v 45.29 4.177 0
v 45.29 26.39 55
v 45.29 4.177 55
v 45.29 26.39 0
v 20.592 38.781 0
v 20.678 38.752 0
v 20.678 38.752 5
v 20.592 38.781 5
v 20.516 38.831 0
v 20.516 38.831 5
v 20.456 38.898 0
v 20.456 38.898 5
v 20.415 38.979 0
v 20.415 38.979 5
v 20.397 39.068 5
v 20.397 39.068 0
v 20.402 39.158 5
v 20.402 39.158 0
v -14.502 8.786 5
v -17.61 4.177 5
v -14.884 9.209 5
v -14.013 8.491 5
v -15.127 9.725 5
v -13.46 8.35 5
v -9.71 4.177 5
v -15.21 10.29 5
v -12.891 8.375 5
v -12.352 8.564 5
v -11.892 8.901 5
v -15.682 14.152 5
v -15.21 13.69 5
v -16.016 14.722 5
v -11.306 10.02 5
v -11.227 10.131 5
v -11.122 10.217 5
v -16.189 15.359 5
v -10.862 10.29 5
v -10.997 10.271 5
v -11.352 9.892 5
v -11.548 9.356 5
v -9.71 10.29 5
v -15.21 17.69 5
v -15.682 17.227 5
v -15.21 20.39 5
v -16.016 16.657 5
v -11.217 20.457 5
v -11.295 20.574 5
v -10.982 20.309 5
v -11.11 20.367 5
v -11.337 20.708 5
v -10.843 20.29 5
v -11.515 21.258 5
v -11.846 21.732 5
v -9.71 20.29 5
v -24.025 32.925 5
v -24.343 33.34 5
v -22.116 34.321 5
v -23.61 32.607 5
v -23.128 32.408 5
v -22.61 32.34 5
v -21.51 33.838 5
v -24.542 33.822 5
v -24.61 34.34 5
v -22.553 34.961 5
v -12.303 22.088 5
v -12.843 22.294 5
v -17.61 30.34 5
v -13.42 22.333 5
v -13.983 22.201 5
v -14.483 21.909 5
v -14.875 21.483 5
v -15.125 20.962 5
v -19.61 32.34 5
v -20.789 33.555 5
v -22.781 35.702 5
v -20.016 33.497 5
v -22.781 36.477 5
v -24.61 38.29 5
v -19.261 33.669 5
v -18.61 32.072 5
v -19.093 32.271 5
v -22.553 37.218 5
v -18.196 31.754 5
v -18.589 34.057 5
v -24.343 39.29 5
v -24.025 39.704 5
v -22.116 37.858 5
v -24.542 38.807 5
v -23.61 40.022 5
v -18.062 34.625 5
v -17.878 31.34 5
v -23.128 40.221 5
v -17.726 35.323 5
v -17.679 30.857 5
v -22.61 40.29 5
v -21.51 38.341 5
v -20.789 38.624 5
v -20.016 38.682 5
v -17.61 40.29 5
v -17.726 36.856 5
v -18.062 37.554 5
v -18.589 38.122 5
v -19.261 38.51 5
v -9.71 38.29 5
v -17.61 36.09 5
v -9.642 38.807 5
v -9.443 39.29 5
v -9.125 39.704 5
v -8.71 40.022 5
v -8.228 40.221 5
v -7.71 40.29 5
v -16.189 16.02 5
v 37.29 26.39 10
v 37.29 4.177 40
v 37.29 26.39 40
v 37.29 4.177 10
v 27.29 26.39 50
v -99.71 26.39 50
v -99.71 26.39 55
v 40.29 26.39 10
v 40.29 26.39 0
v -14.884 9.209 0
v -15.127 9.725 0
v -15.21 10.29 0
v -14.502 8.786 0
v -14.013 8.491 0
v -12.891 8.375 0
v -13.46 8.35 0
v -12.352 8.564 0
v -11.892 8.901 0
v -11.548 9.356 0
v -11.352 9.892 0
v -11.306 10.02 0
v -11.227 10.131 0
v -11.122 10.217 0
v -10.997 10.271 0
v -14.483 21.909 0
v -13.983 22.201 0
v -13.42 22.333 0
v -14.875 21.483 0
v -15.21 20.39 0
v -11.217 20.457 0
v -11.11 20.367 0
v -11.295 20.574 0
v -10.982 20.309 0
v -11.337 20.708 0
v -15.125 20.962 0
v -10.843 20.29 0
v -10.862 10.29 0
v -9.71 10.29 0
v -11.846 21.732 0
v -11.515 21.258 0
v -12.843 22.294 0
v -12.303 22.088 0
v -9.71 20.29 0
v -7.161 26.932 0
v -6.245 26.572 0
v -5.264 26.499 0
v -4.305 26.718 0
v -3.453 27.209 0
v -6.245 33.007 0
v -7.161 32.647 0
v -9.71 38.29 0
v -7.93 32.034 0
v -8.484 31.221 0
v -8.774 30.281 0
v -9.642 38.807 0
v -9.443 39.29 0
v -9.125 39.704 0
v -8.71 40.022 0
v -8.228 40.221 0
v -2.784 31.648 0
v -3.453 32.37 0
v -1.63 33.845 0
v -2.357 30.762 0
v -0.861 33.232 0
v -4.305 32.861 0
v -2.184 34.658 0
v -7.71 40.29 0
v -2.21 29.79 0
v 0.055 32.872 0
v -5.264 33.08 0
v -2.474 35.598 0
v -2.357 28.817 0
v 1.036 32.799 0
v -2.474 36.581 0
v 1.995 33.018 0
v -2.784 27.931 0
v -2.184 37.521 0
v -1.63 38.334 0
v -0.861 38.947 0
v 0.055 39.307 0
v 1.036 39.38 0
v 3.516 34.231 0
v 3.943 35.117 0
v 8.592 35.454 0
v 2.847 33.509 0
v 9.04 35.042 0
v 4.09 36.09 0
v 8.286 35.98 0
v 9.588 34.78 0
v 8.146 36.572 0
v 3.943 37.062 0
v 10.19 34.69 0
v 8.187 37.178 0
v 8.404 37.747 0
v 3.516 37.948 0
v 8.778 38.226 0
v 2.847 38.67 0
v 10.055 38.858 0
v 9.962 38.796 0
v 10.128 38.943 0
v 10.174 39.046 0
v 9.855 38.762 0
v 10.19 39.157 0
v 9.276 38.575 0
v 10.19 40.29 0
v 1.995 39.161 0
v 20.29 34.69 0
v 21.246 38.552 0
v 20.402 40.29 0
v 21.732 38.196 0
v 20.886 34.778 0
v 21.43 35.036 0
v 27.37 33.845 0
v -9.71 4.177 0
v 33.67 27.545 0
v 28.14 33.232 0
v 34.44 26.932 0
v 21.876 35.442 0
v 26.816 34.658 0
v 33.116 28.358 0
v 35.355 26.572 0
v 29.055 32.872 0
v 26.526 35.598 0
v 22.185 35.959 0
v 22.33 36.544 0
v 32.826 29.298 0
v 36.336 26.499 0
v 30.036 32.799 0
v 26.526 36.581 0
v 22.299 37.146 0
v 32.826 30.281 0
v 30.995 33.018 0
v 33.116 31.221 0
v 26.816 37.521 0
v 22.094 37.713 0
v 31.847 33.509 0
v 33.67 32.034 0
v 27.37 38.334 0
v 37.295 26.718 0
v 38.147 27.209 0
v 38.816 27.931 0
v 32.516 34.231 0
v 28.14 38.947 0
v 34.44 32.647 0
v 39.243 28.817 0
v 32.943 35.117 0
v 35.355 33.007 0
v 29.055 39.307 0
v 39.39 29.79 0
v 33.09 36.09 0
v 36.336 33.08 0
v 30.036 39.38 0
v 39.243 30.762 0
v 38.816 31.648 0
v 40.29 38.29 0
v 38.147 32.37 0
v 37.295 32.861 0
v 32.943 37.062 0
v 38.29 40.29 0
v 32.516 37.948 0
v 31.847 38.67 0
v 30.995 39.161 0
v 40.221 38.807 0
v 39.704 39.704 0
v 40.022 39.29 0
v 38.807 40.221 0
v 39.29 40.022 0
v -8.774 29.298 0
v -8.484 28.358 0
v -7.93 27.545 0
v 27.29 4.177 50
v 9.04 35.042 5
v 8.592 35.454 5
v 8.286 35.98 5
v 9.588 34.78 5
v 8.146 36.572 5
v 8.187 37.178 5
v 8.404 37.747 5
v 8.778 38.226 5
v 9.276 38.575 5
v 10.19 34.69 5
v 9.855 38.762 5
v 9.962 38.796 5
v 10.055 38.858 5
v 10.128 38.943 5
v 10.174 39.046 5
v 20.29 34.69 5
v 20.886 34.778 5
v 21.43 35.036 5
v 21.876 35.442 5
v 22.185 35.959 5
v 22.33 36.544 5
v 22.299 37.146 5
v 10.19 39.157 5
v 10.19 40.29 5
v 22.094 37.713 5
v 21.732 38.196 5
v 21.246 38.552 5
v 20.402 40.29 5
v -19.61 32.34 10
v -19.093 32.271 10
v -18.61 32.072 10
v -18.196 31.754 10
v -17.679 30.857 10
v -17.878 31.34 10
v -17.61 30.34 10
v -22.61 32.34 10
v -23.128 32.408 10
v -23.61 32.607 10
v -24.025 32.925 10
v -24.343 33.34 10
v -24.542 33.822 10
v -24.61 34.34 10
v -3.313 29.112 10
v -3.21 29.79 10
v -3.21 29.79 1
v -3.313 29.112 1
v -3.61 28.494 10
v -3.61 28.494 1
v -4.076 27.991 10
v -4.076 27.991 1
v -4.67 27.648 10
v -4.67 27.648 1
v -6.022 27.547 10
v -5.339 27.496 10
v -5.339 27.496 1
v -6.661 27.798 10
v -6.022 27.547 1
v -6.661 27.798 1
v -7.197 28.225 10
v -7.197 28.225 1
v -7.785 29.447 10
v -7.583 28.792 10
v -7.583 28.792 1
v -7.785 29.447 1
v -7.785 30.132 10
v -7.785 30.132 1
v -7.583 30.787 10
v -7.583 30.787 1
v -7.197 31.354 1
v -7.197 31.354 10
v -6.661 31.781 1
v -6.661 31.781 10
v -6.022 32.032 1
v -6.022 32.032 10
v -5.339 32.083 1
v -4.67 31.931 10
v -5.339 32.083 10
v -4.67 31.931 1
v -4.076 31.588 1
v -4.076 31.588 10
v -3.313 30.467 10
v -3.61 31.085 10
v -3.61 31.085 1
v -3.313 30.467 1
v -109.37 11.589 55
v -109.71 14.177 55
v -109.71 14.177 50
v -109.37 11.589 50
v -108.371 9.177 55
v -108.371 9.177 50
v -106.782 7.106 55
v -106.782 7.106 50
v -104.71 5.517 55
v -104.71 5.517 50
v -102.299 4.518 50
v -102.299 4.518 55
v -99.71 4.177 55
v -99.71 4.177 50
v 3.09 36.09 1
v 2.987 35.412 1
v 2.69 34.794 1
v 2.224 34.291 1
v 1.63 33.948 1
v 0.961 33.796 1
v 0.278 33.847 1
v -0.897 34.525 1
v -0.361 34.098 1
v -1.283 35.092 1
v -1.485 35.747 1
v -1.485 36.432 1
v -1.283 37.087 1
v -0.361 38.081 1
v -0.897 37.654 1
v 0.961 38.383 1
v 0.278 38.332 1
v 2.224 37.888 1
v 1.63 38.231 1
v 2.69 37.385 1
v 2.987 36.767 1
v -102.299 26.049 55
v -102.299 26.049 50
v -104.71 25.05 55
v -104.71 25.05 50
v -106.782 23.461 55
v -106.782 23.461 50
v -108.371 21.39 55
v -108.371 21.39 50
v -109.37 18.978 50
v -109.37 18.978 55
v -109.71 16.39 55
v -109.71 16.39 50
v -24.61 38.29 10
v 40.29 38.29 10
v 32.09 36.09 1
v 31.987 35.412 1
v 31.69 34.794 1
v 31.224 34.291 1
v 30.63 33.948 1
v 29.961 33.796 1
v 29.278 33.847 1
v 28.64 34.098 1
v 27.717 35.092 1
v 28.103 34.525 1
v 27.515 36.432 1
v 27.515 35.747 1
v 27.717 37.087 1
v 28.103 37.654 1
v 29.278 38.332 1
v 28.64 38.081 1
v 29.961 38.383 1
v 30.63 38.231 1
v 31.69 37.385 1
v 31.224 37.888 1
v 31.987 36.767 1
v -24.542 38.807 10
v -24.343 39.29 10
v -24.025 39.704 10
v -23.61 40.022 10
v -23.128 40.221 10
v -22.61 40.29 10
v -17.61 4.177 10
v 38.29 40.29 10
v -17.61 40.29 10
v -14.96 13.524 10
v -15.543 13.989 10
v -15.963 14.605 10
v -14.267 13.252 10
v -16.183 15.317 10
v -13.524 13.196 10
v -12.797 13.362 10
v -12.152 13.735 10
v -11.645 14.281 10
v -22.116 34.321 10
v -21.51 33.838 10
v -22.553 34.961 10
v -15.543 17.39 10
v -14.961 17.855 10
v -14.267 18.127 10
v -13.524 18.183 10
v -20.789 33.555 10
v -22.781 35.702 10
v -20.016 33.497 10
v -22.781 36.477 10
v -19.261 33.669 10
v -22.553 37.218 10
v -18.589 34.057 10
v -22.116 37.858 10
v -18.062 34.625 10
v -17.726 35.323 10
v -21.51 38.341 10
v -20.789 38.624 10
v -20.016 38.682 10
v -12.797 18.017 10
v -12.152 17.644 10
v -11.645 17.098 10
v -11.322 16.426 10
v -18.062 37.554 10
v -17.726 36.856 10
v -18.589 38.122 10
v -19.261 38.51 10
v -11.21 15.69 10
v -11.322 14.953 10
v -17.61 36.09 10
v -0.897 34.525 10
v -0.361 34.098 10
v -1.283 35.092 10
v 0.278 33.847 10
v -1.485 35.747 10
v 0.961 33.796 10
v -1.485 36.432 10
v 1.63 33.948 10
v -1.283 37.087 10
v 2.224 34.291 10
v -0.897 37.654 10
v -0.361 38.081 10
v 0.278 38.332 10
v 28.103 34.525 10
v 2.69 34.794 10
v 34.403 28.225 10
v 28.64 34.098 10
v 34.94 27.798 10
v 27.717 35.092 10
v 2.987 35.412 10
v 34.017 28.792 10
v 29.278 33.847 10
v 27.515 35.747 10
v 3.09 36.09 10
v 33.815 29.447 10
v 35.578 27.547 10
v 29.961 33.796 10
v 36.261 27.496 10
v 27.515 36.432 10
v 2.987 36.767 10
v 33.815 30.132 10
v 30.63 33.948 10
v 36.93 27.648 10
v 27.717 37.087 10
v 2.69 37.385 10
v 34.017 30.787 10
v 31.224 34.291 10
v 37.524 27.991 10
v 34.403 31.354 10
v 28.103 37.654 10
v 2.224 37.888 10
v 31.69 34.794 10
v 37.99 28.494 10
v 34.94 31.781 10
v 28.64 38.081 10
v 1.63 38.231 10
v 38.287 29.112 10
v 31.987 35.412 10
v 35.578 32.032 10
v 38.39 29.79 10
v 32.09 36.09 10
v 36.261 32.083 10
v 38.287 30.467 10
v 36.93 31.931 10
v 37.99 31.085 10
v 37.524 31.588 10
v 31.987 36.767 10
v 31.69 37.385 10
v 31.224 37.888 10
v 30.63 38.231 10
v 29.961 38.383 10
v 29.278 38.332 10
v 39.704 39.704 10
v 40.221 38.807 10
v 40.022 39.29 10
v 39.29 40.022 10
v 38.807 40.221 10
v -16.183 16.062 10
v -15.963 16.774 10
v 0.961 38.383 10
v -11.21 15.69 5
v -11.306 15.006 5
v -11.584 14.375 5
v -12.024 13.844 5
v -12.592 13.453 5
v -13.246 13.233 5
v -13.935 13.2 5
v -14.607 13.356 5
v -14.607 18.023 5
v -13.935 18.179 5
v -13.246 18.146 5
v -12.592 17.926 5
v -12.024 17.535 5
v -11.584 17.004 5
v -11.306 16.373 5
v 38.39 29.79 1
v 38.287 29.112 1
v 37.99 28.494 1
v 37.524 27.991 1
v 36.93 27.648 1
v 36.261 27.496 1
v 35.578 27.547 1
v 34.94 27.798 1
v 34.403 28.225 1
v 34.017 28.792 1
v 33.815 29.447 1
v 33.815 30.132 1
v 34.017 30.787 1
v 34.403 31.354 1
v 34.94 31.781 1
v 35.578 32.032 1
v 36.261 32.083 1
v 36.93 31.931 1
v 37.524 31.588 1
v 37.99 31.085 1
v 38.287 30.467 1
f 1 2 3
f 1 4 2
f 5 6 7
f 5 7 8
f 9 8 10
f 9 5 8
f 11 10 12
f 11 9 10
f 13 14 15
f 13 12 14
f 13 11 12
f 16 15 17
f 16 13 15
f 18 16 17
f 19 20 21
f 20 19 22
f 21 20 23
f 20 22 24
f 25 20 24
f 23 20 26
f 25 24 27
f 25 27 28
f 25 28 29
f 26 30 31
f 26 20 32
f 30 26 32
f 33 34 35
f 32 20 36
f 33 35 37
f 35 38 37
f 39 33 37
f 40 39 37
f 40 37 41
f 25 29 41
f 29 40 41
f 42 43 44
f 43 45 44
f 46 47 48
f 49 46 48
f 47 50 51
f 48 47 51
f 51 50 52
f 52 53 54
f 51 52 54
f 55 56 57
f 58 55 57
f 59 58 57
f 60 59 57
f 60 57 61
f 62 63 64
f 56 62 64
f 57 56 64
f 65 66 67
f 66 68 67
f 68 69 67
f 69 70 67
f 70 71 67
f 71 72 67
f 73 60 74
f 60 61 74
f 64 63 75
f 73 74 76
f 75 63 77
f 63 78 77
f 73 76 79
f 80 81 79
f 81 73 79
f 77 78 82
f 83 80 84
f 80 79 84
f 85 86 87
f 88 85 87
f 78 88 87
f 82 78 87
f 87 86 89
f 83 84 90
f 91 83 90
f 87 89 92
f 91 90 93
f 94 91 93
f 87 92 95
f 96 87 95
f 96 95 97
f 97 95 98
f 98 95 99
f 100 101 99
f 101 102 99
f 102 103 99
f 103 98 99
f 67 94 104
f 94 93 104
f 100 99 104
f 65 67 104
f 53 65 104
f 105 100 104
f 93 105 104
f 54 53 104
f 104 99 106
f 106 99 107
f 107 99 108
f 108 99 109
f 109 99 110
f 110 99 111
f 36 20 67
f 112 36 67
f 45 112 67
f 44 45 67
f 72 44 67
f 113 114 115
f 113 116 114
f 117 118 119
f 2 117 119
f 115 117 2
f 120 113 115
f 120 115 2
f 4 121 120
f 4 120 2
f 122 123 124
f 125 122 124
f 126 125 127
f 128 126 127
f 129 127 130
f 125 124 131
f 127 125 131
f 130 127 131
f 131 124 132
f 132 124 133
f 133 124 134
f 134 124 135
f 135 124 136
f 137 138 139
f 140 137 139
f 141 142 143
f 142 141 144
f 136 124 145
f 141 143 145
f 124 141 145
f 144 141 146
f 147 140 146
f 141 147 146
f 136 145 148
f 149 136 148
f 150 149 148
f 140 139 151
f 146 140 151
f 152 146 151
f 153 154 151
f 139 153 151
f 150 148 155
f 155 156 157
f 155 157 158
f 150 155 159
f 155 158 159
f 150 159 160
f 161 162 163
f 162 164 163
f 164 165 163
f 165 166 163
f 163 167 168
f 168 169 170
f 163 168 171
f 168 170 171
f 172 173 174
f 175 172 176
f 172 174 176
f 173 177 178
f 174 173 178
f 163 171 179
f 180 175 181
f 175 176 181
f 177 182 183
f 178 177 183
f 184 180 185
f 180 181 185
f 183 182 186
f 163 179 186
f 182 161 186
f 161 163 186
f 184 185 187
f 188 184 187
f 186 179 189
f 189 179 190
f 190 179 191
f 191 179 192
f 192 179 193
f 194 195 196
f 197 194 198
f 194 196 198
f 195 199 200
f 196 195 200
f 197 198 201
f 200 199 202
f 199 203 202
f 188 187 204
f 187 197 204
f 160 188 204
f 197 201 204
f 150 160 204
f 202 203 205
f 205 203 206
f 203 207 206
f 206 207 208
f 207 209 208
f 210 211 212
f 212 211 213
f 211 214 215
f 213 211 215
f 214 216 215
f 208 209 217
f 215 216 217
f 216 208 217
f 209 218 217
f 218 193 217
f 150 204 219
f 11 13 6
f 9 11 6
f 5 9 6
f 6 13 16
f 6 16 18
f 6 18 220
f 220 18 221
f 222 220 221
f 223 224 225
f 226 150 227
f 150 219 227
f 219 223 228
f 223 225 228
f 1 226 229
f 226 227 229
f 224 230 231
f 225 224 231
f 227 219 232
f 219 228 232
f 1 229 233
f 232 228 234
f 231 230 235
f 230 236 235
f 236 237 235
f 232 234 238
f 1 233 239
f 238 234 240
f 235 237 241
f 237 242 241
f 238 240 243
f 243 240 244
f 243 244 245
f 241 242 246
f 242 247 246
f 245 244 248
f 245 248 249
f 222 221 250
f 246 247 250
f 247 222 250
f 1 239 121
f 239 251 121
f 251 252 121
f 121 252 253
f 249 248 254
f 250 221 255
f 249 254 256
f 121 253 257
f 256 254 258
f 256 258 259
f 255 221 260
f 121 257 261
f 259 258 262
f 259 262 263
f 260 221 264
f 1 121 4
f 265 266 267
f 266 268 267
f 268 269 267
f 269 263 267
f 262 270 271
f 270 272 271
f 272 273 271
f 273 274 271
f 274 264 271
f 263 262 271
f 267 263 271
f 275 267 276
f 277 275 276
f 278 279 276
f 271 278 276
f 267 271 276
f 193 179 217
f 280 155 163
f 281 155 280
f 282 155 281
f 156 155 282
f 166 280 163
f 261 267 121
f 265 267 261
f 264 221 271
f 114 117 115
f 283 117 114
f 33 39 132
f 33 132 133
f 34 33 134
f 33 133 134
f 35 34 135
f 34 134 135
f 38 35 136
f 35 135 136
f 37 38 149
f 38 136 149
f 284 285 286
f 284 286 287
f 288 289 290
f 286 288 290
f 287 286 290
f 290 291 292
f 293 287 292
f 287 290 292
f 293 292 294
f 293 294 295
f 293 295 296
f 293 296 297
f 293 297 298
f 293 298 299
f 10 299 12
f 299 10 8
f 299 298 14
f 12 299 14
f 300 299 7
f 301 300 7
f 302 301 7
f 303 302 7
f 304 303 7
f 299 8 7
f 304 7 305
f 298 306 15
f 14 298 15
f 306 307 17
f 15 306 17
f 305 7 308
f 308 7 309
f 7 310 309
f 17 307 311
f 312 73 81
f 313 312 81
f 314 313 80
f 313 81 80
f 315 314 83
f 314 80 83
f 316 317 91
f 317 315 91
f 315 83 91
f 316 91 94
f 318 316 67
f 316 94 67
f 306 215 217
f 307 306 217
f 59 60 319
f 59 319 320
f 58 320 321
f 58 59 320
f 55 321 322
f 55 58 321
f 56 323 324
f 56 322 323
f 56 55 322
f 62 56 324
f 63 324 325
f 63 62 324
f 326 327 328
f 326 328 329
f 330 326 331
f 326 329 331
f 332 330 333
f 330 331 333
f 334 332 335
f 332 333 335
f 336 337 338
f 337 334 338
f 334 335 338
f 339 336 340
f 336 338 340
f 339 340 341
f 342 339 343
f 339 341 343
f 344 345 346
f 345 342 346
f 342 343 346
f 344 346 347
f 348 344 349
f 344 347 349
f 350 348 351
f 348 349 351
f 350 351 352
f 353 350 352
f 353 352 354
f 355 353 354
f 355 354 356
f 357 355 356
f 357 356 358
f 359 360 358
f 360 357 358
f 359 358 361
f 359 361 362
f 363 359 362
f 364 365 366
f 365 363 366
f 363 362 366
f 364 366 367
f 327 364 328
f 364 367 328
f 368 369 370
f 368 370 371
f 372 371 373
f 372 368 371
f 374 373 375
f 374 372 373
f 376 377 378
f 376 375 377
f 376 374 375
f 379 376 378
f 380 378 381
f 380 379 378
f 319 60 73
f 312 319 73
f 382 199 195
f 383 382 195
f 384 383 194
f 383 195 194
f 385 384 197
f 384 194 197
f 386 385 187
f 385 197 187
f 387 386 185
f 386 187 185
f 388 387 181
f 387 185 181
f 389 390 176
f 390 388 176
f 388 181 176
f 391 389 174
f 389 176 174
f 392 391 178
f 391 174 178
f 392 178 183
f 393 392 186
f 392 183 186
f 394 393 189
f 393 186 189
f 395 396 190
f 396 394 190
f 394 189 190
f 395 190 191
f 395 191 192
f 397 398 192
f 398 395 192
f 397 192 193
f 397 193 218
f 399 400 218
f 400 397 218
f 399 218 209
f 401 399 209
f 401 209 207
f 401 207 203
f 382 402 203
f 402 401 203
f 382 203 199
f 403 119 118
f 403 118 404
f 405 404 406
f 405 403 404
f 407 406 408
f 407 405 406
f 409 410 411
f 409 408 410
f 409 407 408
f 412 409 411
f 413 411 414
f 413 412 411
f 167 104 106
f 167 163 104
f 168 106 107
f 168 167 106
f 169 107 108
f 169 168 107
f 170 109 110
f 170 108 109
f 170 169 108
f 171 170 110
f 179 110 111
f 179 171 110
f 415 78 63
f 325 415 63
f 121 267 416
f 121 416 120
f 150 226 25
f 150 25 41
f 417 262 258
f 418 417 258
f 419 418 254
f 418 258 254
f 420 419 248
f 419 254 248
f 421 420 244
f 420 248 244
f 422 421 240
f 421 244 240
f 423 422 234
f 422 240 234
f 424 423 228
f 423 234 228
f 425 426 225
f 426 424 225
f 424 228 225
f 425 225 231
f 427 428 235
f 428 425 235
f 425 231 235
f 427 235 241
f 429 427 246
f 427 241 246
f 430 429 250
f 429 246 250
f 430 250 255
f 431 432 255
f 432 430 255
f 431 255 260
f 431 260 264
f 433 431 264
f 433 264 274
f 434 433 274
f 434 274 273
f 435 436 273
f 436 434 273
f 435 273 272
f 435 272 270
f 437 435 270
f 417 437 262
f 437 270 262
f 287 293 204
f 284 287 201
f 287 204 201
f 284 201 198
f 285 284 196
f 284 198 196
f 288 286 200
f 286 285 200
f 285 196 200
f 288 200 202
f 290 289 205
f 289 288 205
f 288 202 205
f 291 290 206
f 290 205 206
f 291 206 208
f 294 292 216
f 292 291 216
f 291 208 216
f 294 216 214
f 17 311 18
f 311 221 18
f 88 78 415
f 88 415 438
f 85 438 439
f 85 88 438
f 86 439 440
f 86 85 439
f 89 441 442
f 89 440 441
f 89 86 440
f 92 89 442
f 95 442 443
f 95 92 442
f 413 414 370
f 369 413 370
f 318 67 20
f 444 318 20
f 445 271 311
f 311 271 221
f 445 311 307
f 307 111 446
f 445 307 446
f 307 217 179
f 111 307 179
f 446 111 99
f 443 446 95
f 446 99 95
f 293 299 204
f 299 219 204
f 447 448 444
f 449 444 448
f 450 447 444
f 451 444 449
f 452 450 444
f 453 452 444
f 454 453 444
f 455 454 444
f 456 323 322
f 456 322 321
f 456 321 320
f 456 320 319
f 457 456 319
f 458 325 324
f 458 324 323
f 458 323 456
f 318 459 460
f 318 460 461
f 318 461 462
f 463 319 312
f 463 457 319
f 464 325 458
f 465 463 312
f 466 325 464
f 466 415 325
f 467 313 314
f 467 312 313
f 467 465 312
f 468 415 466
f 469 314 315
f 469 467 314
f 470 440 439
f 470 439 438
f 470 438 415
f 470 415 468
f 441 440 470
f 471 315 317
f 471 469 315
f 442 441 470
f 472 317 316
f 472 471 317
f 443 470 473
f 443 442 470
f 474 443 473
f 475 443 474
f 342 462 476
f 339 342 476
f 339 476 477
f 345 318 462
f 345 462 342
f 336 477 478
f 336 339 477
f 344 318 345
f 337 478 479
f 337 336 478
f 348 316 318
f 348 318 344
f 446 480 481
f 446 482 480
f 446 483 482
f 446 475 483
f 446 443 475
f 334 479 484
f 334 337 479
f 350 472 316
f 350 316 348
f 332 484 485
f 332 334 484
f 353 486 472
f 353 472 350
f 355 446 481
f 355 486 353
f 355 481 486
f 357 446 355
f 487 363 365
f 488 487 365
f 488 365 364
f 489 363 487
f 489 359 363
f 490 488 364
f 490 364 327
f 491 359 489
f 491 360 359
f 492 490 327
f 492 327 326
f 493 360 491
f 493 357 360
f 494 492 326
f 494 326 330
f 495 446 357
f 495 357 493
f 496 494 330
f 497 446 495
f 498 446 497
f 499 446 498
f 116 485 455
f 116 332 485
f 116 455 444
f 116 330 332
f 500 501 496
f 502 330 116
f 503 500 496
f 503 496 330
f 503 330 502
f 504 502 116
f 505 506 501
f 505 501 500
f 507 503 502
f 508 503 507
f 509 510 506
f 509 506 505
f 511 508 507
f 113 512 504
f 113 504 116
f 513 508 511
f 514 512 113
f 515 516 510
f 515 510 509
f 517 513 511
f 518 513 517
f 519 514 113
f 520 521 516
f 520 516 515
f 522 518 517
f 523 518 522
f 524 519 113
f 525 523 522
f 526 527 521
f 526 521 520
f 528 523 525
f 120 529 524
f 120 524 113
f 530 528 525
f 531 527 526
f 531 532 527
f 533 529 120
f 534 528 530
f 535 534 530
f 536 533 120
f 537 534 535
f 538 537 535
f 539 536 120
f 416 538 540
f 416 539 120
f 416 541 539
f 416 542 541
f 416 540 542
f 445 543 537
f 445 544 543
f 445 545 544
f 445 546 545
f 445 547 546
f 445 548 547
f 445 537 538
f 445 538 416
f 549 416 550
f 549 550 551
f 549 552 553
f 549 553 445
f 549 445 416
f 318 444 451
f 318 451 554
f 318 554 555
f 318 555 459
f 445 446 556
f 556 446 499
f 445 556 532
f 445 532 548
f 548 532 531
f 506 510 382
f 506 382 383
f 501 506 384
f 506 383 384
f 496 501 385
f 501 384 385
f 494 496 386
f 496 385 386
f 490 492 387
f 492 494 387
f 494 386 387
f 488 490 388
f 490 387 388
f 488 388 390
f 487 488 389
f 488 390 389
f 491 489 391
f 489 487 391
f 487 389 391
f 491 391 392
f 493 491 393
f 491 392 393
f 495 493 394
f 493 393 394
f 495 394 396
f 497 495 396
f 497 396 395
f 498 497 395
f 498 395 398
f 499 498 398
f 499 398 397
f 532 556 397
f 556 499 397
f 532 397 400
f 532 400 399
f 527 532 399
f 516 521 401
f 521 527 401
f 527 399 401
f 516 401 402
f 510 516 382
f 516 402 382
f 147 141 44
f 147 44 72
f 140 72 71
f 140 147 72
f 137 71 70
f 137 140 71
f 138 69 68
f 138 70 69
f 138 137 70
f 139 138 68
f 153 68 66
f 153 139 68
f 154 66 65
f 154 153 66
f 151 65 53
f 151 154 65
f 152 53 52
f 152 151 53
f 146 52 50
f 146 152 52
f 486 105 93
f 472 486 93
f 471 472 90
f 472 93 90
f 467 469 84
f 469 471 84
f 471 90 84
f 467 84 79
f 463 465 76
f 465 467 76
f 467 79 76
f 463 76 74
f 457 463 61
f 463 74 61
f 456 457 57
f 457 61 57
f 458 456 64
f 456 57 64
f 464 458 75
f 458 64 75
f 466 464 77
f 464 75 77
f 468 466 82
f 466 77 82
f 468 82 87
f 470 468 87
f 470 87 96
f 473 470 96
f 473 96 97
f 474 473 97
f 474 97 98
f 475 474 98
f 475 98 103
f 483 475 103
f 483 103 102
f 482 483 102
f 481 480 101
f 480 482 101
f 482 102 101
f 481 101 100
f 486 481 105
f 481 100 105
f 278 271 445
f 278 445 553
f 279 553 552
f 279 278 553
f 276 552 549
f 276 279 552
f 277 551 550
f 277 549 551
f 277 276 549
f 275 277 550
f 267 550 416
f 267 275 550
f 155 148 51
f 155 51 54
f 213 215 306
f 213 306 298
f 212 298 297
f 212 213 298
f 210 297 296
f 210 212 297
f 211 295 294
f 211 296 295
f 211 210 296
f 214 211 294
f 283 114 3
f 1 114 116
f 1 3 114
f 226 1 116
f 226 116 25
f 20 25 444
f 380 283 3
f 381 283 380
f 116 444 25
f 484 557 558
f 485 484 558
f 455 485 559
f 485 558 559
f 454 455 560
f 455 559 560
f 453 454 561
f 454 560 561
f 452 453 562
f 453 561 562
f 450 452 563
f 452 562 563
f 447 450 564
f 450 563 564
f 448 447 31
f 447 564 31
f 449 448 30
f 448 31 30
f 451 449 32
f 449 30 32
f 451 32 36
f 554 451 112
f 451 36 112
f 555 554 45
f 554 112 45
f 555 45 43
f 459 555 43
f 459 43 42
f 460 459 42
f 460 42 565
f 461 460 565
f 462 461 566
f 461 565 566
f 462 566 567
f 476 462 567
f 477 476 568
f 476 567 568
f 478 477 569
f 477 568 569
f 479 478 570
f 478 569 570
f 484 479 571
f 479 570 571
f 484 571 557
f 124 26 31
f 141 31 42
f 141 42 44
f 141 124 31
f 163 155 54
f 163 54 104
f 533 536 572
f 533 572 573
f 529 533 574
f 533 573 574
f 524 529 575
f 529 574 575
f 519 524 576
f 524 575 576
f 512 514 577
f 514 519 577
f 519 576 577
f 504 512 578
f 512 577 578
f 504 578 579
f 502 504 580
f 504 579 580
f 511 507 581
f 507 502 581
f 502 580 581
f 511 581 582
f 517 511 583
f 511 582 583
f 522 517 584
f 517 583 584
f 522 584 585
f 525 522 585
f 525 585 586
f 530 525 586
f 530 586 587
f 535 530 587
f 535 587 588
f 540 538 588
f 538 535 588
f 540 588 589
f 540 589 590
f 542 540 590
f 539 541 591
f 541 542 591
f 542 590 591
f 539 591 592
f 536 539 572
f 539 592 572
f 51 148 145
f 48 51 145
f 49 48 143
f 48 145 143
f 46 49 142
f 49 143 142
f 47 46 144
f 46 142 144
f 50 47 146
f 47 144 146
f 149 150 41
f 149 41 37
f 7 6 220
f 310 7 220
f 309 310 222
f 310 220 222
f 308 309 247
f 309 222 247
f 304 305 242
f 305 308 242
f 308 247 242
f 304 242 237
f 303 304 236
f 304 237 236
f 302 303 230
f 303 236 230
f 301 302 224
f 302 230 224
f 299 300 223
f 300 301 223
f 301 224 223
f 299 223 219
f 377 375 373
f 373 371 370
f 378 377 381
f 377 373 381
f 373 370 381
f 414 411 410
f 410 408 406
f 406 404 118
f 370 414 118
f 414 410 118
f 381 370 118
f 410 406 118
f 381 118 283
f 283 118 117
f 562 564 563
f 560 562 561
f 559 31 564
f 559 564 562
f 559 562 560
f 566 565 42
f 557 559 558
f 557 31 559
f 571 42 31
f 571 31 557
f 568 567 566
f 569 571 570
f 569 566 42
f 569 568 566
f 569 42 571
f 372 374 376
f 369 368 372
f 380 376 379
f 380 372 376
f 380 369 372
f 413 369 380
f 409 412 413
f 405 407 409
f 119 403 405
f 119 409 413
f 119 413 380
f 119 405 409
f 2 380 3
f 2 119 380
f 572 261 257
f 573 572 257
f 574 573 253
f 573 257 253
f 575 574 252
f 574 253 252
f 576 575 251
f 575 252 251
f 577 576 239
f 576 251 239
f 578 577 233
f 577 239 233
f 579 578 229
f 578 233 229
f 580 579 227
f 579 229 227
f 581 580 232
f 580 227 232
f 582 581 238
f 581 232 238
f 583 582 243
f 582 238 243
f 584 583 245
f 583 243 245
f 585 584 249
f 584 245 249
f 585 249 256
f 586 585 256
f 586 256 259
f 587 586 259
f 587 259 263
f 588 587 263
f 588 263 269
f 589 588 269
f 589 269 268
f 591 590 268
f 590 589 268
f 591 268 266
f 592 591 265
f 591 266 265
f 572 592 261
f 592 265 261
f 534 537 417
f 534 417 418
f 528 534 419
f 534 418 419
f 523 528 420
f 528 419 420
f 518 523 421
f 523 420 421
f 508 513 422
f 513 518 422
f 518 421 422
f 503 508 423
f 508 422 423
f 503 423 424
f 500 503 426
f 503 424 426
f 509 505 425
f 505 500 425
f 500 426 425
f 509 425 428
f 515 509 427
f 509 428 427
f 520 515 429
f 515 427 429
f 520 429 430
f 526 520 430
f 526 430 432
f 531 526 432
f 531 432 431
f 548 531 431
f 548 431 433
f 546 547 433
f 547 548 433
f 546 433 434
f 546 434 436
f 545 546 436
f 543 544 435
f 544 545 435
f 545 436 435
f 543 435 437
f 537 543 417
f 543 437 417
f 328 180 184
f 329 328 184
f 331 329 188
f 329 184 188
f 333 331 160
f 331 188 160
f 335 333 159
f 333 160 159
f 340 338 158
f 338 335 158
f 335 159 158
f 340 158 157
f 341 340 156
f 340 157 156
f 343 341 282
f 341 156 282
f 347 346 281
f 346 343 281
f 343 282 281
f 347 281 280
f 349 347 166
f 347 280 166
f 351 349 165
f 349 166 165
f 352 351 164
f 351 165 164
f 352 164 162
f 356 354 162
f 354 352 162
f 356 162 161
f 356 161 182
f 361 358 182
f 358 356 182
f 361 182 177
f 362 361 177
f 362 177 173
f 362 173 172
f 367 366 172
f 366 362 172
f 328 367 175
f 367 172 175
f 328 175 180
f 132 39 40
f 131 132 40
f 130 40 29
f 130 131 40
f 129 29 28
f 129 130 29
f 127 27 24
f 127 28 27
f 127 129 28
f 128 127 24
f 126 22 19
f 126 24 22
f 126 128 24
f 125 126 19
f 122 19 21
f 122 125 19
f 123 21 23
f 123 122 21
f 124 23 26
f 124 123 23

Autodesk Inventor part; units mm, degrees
ref_plane "YZ Plane" through (0, 0, 0) normal (1, 0, 0) x (0, 1, 0)
ref_plane "XZ Plane" through (0, 0, 0) normal (0, 1, 0) x (-1, 0, 0)
ref_plane "XY Plane" through (0, 0, 0) normal (0, 0, 1) x (1, 0, 0)
ref_plane "Arbeitsebene1" through (0, 0, 0) normal (0, 0, 1) x (1, 0, 0)
sketch "Skizze1" plane through (0, 0, 0) normal (0, 0, 1) x (1, 0, 0)
  circle A0 centre (-6.0705, 15.2895) radius 3.5 projected
  circle A1 centre (15.2895, -6.0705) radius 3.5 projected
  line L0 (30.5395, 32.5395) -> (0.0395, 32.5395) projected
  arc A2 (32.5395, 30.5395) -> (30.5395, 32.5395) centre (30.5395, 30.5395) ccw projected
  line L1 (32.5395, 30.5395) -> (32.5395, 0.0395) projected
  arc A3 (30.5395, -1.9605) -> (32.5395, 0.0395) centre (30.5395, 0.0395) ccw projected
  line L2 (0.0395, -1.9605) -> (30.5395, -1.9605) projected
  arc A4 (-1.9605, 0.0395) -> (0.0395, -1.9605) centre (0.0395, 0.0395) ccw projected
  line L3 (-1.9605, 0.0395) -> (-1.9605, 30.5395) projected
  arc A5 (0.0395, 32.5395) -> (-1.9605, 30.5395) centre (0.0395, 30.5395) ccw projected
  circle A6 centre (-4.7105, -4.7105) radius 2.45 projected
  circle A7 centre (0.7895, -5.5105) radius 2.3 projected
  circle A8 centre (-5.5105, 0.7895) radius 2.3 projected
  circle A9 centre (-5.5105, 29.7895) radius 2.3 projected
  circle A10 centre (0.7895, 36.0895) radius 2.3 projected
  circle A11 centre (-4.7105, 35.2895) radius 2.45 projected
  circle A12 centre (36.0895, 0.7895) radius 2.3 projected
  circle A13 centre (29.7895, -5.5105) radius 2.3 projected
  circle A14 centre (35.2895, -4.7105) radius 2.45 projected
  circle A15 centre (36.0895, 29.7895) radius 2.3 projected
  circle A16 centre (29.7895, 36.0895) radius 2.3 projected
  circle A17 centre (35.2895, 35.2895) radius 2.45 projected
  line L4 (20.4019, 40.2895) -> (20.4019, 39.1582) projected
  arc A18 (20.4019, 39.1582) -> (20.6778, 38.7524) centre (20.7437, 39.0939) ccw projected
  arc A19 (20.2895, 34.6895) -> (20.6778, 38.7524) centre (20.2895, 36.7395) ccw projected
  line L5 (20.2895, 34.6895) -> (10.1895, 34.6895) projected
  arc A20 (9.8548, 38.762) -> (10.1895, 34.6895) centre (10.1895, 36.7395) ccw projected
  arc A21 (9.8548, 38.762) -> (10.1895, 39.1567) centre (9.7895, 39.1567) ccw projected
  line L6 (10.1895, 39.1567) -> (10.1895, 40.2895) projected
  line L7 (10.1895, 40.2895) -> (-7.7105, 40.2895) projected
  arc A22 (-7.7105, 40.2895) -> (-9.7105, 38.2895) centre (-7.7105, 38.2895) ccw projected
  line L8 (-9.7105, 20.2895) -> (-9.7105, 38.2895) projected
  line L9 (-10.8433, 20.2895) -> (-9.7105, 20.2895) projected
  arc A23 (-11.3366, 20.7079) -> (-10.8433, 20.2895) centre (-10.8433, 20.7895) ccw projected
  arc A24 (-11.3366, 20.7079) -> (-15.2105, 20.3895) centre (-13.2605, 20.3895) ccw projected
  line L10 (-15.2105, 10.2895) -> (-15.2105, 20.3895) projected
  arc A25 (-15.2105, 10.2895) -> (-11.3515, 9.8916) centre (-13.2605, 10.2895) ccw projected
  arc A26 (-10.862, 10.2895) -> (-11.3515, 9.8916) centre (-10.862, 9.7895) ccw projected
  line L11 (-9.7105, 10.2895) -> (-10.862, 10.2895) projected
  line L12 (-9.7105, -7.7105) -> (-9.7105, 10.2895) projected
  arc A27 (-9.7105, -7.7105) -> (-7.7105, -9.7105) centre (-7.7105, -7.7105) ccw projected
  line L13 (-7.7105, -9.7105) -> (10.2895, -9.7105) projected
  line L14 (10.2895, -10.8433) -> (10.2895, -9.7105) projected
  arc A28 (9.8712, -11.3366) -> (10.2895, -10.8433) centre (9.7895, -10.8433) ccw projected
  arc A29 (9.8712, -11.3366) -> (10.1895, -15.2105) centre (10.1895, -13.2605) ccw projected
  line L15 (20.2895, -15.2105) -> (10.1895, -15.2105) projected
  arc A30 (20.2895, -15.2105) -> (20.6875, -11.3515) centre (20.2895, -13.2605) ccw projected
  arc A31 (20.2895, -10.862) -> (20.6875, -11.3515) centre (20.7895, -10.862) ccw projected
  line L16 (20.2895, -9.7105) -> (20.2895, -10.862) projected
  line L17 (20.2895, -9.7105) -> (38.2895, -9.7105) projected
  arc A32 (38.2895, -9.7105) -> (40.2895, -7.7105) centre (38.2895, -7.7105) ccw projected
  line L18 (40.2895, 10.1772) -> (40.2895, -7.7105) projected
  line L19 (40.2895, 10.1772) -> (39.1582, 10.1772) projected
  arc A33 (39.1582, 10.1772) -> (38.7524, 9.9013) centre (39.0939, 9.8354) ccw projected
  arc A34 (34.6895, 10.2895) -> (38.7524, 9.9013) centre (36.7395, 10.2895) ccw projected
  line L20 (34.6895, 10.2895) -> (34.6895, 20.3895) projected
  arc A35 (38.762, 20.7242) -> (34.6895, 20.3895) centre (36.7395, 20.3895) ccw projected
  arc A36 (38.762, 20.7242) -> (39.1567, 20.3895) centre (39.1567, 20.7895) ccw projected
  line L21 (39.1567, 20.3895) -> (40.2895, 20.3895) projected
  line L22 (40.2895, 38.2895) -> (40.2895, 20.3895) projected
  arc A37 (40.2895, 38.2895) -> (38.2895, 40.2895) centre (38.2895, 38.2895) ccw projected
  line L23 (38.2895, 40.2895) -> (20.4019, 40.2895) projected
  line L24 (40.2895, 26.3895) -> (45.2895, 26.3895)
  line L25 (45.2895, 26.3895) -> (45.2895, 4.1772)
  line L26 (45.2895, 4.1772) -> (40.2895, 4.1772)
  line L27 (40.2895, 4.1772) -> (40.2895, 26.3895)
  point P0 (0, 0)
  dimension "d0" = 5
  dimension "d2" = 6
  dimension "d3" = 6
extrude "Extrusion1" add sketch "Skizze1" along normal blind 5 contours A0 | A2 L1 A3 L2 A4 L3 A5 L0 | A6 | A11 | A14 | A17 | L23 A37 L22 L21 A36 A35 L20 A34 A33 L19 L18 A32 L17 L16 A31 A30 L15 A29 A28 L14 L13 A27 L12 L11 A26 A25 L10 A24 A23 L9 L8 A22 L7 L6 A21 A20 L5 A19 A18 L4 | L24 L25 L26 L18 L27 L22 | L27 L19 A33 A34 L20 A35 A36 L21
chamfer "Fase1" distance 1 angle 45 8 edges at (-1.5105, 36.0895, 0) (27.4895, 36.0895, 0) (33.7895, 29.7895, 0) (33.7895, 0.7895, 0) (27.4895, -5.5105, 0) (-1.5105, -5.5105, 0) (-7.8105, 0.7895, 0) (-7.8105, 29.7895, 0)
sketch "Skizze2" plane through (0, 0, 5) normal (0, 0, 1) x (1, 0, 0)
  line L0 (40.2895, 4.1772) -> (45.2895, 4.1772) projected
  line L1 (45.2895, 26.3895) -> (40.2895, 26.3895) projected
  line L2 (45.2895, 4.1772) -> (37.2895, 4.1772)
  line L3 (37.2895, 4.1772) -> (37.2895, 26.3895)
  line L4 (37.2895, 26.3895) -> (45.2895, 26.3895)
  line L5 (45.2895, 26.3895) -> (45.2895, 4.1772)
  point P0 (0, 0)
  point P1 (45.2895, 26.3895)
  point P2 (40.2895, 4.1772)
  dimension "d9" = 8
extrude "Extrusion2" add sketch "Skizze2" along normal blind 45
sketch "Skizze3" plane through (0, 0, 50) normal (0, 0, 1) x (1, 0, 0)
  line L0 (45.2895, 26.3895) -> (37.2895, 26.3895) projected
  line L1 (37.2895, 26.3895) -> (37.2895, 4.1772) projected
  line L2 (37.2895, 4.1772) -> (45.2895, 4.1772) projected
  line L3 (45.2895, 4.1772) -> (45.2895, 26.3895) projected
  line L4 (45.2895, 26.3895) -> (37.2895, 26.3895) projected
  line L5 (37.2895, 26.3895) -> (-109.7105, 26.3895)
  line L6 (-109.7105, 26.3895) -> (-109.7105, 4.1772)
  line L7 (-109.7105, 4.1772) -> (37.2895, 4.1772)
  line L8 (37.2895, 4.1772) -> (37.2895, 26.3895)
  circle A0 centre (36.0895, 29.7895) radius 2.3 projected
  circle A1 centre (29.7895, -5.5105) radius 2.3 projected
  circle A2 centre (0.7895, 36.0895) radius 2.3 projected
  circle A3 centre (-5.5105, 29.7895) radius 2.3 projected
  circle A4 centre (-5.5105, 0.7895) radius 2.3 projected
  circle A5 centre (0.7895, -5.5105) radius 2.3 projected
  circle A6 centre (15.2895, -6.0705) radius 3.5 projected
  circle A7 centre (36.0895, 0.7895) radius 2.3 projected
  circle A8 centre (29.7895, 36.0895) radius 2.3 projected
  arc A9 (40.2895, 38.2895) -> (38.2895, 40.2895) centre (38.2895, 38.2895) ccw projected
  line L9 (38.2895, 40.2895) -> (20.4019, 40.2895) projected
  line L10 (20.4019, 40.2895) -> (20.4019, 39.1582) projected
  arc A10 (20.4019, 39.1582) -> (20.6778, 38.7524) centre (20.7437, 39.0939) ccw projected
  arc A11 (20.2895, 34.6895) -> (20.6778, 38.7524) centre (20.2895, 36.7395) ccw projected
  line L11 (20.2895, 34.6895) -> (10.1895, 34.6895) projected
  arc A12 (9.8548, 38.762) -> (10.1895, 34.6895) centre (10.1895, 36.7395) ccw projected
  arc A13 (9.8548, 38.762) -> (10.1895, 39.1567) centre (9.7895, 39.1567) ccw projected
  line L12 (10.1895, 39.1567) -> (10.1895, 40.2895) projected
  line L13 (10.1895, 40.2895) -> (-7.7105, 40.2895) projected
  arc A14 (-7.7105, 40.2895) -> (-9.7105, 38.2895) centre (-7.7105, 38.2895) ccw projected
  line L14 (-9.7105, 38.2895) -> (-9.7105, 20.2895) projected
  line L15 (-9.7105, 20.2895) -> (-10.8433, 20.2895) projected
  arc A15 (-11.3366, 20.7079) -> (-10.8433, 20.2895) centre (-10.8433, 20.7895) ccw projected
  arc A16 (-11.3366, 20.7079) -> (-15.2105, 20.3895) centre (-13.2605, 20.3895) ccw projected
  line L16 (-15.2105, 20.3895) -> (-15.2105, 10.2895) projected
  arc A17 (-15.2105, 10.2895) -> (-11.3515, 9.8916) centre (-13.2605, 10.2895) ccw projected
  arc A18 (-10.862, 10.2895) -> (-11.3515, 9.8916) centre (-10.862, 9.7895) ccw projected
  line L17 (-10.862, 10.2895) -> (-9.7105, 10.2895) projected
  line L18 (-9.7105, 10.2895) -> (-9.7105, -7.7105) projected
  arc A19 (-9.7105, -7.7105) -> (-7.7105, -9.7105) centre (-7.7105, -7.7105) ccw projected
  line L19 (-7.7105, -9.7105) -> (10.2895, -9.7105) projected
  line L20 (10.2895, -9.7105) -> (10.2895, -10.8433) projected
  arc A20 (9.8712, -11.3366) -> (10.2895, -10.8433) centre (9.7895, -10.8433) ccw projected
  arc A21 (9.8712, -11.3366) -> (10.1895, -15.2105) centre (10.1895, -13.2605) ccw projected
  line L21 (10.1895, -15.2105) -> (20.2895, -15.2105) projected
  arc A22 (20.2895, -15.2105) -> (20.6875, -11.3515) centre (20.2895, -13.2605) ccw projected
  arc A23 (20.2895, -10.862) -> (20.6875, -11.3515) centre (20.7895, -10.862) ccw projected
  line L22 (20.2895, -10.862) -> (20.2895, -9.7105) projected
  line L23 (20.2895, -9.7105) -> (38.2895, -9.7105) projected
  arc A24 (38.2895, -9.7105) -> (40.2895, -7.7105) centre (38.2895, -7.7105) ccw projected
  line L24 (40.2895, -7.7105) -> (40.2895, 4.1772) projected
  line L25 (37.2895, 4.1772) -> (37.2895, 26.3895) projected
  line L26 (40.2895, 26.3895) -> (40.2895, 38.2895) projected
  line L27 (37.2895, 26.3895) -> (40.2895, 26.3895) projected
  line L28 (40.2895, 4.1772) -> (37.2895, 4.1772) projected
  point P0 (0, 0)
  dimension "d24" = 100
extrude "Extrusion3" add sketch "Skizze3" along normal blind 5 contours L3 L2 L1 L0 | L1 L7 L18 L17 A18 A17 L16 A16 A15 L15 L14 L5 | L14 L15 A15 A16 L16 A17 A18 L17 L18 L7 L6 L5
chamfer "Fase2" distance 10 angle 45 1 edges at (37.2895, 15.2834, 50)
sketch "Skizze5" plane through (0, 0, 5) normal (0, 0, 1) x (1, 0, 0)
  line L0 (-109.7105, 4.1772) -> (45.2895, 4.1772) projected
  line L1 (45.2895, 4.1772) -> (45.2895, 26.3895) projected
  line L2 (45.2895, 26.3895) -> (-109.7105, 26.3895) projected
  line L3 (-109.7105, 26.3895) -> (-109.7105, 4.1772) projected
  line L4 (-109.7105, 4.1772) -> (45.2895, 4.1772) projected
  line L5 (-38.4596, 4.1772) -> (42.3638, 4.1772)
  line L6 (42.3638, 4.1772) -> (42.3638, -19.3333)
  line L7 (42.3638, -19.3333) -> (-38.4596, -19.3333)
  line L8 (-38.4596, -19.3333) -> (-38.4596, 4.1772)
  point P0 (0, 0)
  point P1 (-38.4596, 4.1772)
  point P2 (-38.4596, 4.1772)
extrude "Extrusion5" cut sketch "Skizze5" against normal blind 10 contours L0 L6 L7 L8
fillet "Rundung1" radius 10 2 edges at (-109.7105, 4.1772, 52.5) (-109.7105, 26.3895, 52.5)
sketch "Skizze6" plane through (0, 0, 5) normal (0, 0, 1) x (1, 0, 0)
  circle A0 centre (36.0895, 29.7895) radius 2.3 projected
  circle A1 centre (0.7895, 36.0895) radius 2.3 projected
  circle A2 centre (-5.5105, 29.7895) radius 2.3 projected
  circle A3 centre (29.7895, 36.0895) radius 2.3 projected
  line L0 (-9.7105, 4.1772) -> (37.2895, 4.1772) projected
  line L1 (37.2895, 26.3895) -> (40.2895, 26.3895) projected
  line L2 (40.2895, 26.3895) -> (40.2895, 38.2895) projected
  arc A4 (40.2895, 38.2895) -> (38.2895, 40.2895) centre (38.2895, 38.2895) ccw projected
  line L3 (38.2895, 40.2895) -> (20.4019, 40.2895) projected
  line L4 (20.4019, 40.2895) -> (20.4019, 39.1582) projected
  arc A5 (20.4019, 39.1582) -> (20.6778, 38.7524) centre (20.7437, 39.0939) ccw projected
  arc A6 (20.2895, 34.6895) -> (20.6778, 38.7524) centre (20.2895, 36.7395) ccw projected
  line L5 (20.2895, 34.6895) -> (10.1895, 34.6895) projected
  arc A7 (9.8548, 38.762) -> (10.1895, 34.6895) centre (10.1895, 36.7395) ccw projected
  arc A8 (9.8548, 38.762) -> (10.1895, 39.1567) centre (9.7895, 39.1567) ccw projected
  line L6 (10.1895, 39.1567) -> (10.1895, 40.2895) projected
  line L7 (10.1895, 40.2895) -> (-7.7105, 40.2895) projected
  arc A9 (-7.7105, 40.2895) -> (-9.7105, 38.2895) centre (-7.7105, 38.2895) ccw projected
  line L8 (-9.7105, 38.2895) -> (-9.7105, 20.2895) projected
  line L9 (-9.7105, 20.2895) -> (-10.8433, 20.2895) projected
  arc A10 (-11.3366, 20.7079) -> (-10.8433, 20.2895) centre (-10.8433, 20.7895) ccw projected
  arc A11 (-11.3366, 20.7079) -> (-15.2105, 20.3895) centre (-13.2605, 20.3895) ccw projected
  line L10 (-15.2105, 20.3895) -> (-15.2105, 10.2895) projected
  arc A12 (-15.2105, 10.2895) -> (-11.3515, 9.8916) centre (-13.2605, 10.2895) ccw projected
  arc A13 (-10.862, 10.2895) -> (-11.3515, 9.8916) centre (-10.862, 9.7895) ccw projected
  line L11 (-10.862, 10.2895) -> (-9.7105, 10.2895) projected
  line L12 (-9.7105, 10.2895) -> (-9.7105, 4.1772) projected
  circle A14 centre (-20.2105, 36.0895) radius 2.6
  line L13 (20.4019, 40.2895) -> (10.1895, 40.2895)
  line L14 (-9.7105, 40.2895) -> (-17.6105, 40.2895)
  line L15 (-17.6105, 30.3395) -> (-17.6105, 4.1772)
  line L16 (-17.6105, 4.1772) -> (-9.7105, 4.1772)
  line L17 (-9.7105, 4.1772) -> (-9.7105, 40.2895)
  line L18 (-17.6105, 40.2895) -> (-22.6105, 40.2895)
  line L19 (-24.6105, 38.2895) -> (-24.6105, 34.3395)
  line L20 (-22.6105, 32.3395) -> (-19.6105, 32.3395)
  line L21 (-17.6105, 32.3395) -> (-17.6105, 40.2895)
  circle A15 centre (-14.7105, 35.2895) radius 2.425 projected
  circle A16 centre (-13.9105, 29.7895) radius 2.6 projected
  line L22 (27.2895, 4.1772) -> (37.2895, 4.1772) projected
  line L23 (37.2895, 4.1772) -> (37.2895, 26.3895) projected
  line L24 (37.2895, 26.3895) -> (27.2895, 26.3895) projected
  line L25 (27.2895, 26.3895) -> (27.2895, 4.1772) projected
  circle A17 centre (-13.7105, 15.6895) radius 2.5
  line L26 (37.2895, 4.1772) -> (37.2895, 26.3895) projected
  line L27 (-9.7105, 40.2895) -> (-7.7105, 40.2895)
  arc A18 (-22.6105, 40.2895) -> (-24.6105, 38.2895) centre (-22.6105, 38.2895) ccw
  arc A19 (-24.6105, 34.3395) -> (-22.6105, 32.3395) centre (-22.6105, 34.3395) ccw
  arc A20 (-17.6105, 30.3395) -> (-19.6105, 32.3395) centre (-19.6105, 30.3395) ccw
  point P0 (0, 0)
  point P1 (-24.6105, 32.3395)
  point P2 (-24.6105, 40.2895)
  point P3 (-17.6105, 32.3395)
  dimension "d25" = 7
  dimension "d28" = 2
extrude "Extrusion6" add sketch "Skizze6" along normal blind 5 contours L12 L17 L8 A9 L7 L6 A8 A7 L5 A6 A5 L4 L3 A4 L2 L1 L24 L25 L0 | L16 L15 A20 L20 A19 L19 A18 L18 L14 L17 L8 L9 A10 A11 L10 A17 A12 A13 L11 L12 | L25 L24 L23 L0 | L11 A13 A12 L10 A17 A11 A10 L9 L17 | L17 L27 A9 | L13 L4 A5 A6 L5 A7 A8 L6 | A15 | A16
properties part number "40_Cube_XY_Table_Illumination_Arm"
